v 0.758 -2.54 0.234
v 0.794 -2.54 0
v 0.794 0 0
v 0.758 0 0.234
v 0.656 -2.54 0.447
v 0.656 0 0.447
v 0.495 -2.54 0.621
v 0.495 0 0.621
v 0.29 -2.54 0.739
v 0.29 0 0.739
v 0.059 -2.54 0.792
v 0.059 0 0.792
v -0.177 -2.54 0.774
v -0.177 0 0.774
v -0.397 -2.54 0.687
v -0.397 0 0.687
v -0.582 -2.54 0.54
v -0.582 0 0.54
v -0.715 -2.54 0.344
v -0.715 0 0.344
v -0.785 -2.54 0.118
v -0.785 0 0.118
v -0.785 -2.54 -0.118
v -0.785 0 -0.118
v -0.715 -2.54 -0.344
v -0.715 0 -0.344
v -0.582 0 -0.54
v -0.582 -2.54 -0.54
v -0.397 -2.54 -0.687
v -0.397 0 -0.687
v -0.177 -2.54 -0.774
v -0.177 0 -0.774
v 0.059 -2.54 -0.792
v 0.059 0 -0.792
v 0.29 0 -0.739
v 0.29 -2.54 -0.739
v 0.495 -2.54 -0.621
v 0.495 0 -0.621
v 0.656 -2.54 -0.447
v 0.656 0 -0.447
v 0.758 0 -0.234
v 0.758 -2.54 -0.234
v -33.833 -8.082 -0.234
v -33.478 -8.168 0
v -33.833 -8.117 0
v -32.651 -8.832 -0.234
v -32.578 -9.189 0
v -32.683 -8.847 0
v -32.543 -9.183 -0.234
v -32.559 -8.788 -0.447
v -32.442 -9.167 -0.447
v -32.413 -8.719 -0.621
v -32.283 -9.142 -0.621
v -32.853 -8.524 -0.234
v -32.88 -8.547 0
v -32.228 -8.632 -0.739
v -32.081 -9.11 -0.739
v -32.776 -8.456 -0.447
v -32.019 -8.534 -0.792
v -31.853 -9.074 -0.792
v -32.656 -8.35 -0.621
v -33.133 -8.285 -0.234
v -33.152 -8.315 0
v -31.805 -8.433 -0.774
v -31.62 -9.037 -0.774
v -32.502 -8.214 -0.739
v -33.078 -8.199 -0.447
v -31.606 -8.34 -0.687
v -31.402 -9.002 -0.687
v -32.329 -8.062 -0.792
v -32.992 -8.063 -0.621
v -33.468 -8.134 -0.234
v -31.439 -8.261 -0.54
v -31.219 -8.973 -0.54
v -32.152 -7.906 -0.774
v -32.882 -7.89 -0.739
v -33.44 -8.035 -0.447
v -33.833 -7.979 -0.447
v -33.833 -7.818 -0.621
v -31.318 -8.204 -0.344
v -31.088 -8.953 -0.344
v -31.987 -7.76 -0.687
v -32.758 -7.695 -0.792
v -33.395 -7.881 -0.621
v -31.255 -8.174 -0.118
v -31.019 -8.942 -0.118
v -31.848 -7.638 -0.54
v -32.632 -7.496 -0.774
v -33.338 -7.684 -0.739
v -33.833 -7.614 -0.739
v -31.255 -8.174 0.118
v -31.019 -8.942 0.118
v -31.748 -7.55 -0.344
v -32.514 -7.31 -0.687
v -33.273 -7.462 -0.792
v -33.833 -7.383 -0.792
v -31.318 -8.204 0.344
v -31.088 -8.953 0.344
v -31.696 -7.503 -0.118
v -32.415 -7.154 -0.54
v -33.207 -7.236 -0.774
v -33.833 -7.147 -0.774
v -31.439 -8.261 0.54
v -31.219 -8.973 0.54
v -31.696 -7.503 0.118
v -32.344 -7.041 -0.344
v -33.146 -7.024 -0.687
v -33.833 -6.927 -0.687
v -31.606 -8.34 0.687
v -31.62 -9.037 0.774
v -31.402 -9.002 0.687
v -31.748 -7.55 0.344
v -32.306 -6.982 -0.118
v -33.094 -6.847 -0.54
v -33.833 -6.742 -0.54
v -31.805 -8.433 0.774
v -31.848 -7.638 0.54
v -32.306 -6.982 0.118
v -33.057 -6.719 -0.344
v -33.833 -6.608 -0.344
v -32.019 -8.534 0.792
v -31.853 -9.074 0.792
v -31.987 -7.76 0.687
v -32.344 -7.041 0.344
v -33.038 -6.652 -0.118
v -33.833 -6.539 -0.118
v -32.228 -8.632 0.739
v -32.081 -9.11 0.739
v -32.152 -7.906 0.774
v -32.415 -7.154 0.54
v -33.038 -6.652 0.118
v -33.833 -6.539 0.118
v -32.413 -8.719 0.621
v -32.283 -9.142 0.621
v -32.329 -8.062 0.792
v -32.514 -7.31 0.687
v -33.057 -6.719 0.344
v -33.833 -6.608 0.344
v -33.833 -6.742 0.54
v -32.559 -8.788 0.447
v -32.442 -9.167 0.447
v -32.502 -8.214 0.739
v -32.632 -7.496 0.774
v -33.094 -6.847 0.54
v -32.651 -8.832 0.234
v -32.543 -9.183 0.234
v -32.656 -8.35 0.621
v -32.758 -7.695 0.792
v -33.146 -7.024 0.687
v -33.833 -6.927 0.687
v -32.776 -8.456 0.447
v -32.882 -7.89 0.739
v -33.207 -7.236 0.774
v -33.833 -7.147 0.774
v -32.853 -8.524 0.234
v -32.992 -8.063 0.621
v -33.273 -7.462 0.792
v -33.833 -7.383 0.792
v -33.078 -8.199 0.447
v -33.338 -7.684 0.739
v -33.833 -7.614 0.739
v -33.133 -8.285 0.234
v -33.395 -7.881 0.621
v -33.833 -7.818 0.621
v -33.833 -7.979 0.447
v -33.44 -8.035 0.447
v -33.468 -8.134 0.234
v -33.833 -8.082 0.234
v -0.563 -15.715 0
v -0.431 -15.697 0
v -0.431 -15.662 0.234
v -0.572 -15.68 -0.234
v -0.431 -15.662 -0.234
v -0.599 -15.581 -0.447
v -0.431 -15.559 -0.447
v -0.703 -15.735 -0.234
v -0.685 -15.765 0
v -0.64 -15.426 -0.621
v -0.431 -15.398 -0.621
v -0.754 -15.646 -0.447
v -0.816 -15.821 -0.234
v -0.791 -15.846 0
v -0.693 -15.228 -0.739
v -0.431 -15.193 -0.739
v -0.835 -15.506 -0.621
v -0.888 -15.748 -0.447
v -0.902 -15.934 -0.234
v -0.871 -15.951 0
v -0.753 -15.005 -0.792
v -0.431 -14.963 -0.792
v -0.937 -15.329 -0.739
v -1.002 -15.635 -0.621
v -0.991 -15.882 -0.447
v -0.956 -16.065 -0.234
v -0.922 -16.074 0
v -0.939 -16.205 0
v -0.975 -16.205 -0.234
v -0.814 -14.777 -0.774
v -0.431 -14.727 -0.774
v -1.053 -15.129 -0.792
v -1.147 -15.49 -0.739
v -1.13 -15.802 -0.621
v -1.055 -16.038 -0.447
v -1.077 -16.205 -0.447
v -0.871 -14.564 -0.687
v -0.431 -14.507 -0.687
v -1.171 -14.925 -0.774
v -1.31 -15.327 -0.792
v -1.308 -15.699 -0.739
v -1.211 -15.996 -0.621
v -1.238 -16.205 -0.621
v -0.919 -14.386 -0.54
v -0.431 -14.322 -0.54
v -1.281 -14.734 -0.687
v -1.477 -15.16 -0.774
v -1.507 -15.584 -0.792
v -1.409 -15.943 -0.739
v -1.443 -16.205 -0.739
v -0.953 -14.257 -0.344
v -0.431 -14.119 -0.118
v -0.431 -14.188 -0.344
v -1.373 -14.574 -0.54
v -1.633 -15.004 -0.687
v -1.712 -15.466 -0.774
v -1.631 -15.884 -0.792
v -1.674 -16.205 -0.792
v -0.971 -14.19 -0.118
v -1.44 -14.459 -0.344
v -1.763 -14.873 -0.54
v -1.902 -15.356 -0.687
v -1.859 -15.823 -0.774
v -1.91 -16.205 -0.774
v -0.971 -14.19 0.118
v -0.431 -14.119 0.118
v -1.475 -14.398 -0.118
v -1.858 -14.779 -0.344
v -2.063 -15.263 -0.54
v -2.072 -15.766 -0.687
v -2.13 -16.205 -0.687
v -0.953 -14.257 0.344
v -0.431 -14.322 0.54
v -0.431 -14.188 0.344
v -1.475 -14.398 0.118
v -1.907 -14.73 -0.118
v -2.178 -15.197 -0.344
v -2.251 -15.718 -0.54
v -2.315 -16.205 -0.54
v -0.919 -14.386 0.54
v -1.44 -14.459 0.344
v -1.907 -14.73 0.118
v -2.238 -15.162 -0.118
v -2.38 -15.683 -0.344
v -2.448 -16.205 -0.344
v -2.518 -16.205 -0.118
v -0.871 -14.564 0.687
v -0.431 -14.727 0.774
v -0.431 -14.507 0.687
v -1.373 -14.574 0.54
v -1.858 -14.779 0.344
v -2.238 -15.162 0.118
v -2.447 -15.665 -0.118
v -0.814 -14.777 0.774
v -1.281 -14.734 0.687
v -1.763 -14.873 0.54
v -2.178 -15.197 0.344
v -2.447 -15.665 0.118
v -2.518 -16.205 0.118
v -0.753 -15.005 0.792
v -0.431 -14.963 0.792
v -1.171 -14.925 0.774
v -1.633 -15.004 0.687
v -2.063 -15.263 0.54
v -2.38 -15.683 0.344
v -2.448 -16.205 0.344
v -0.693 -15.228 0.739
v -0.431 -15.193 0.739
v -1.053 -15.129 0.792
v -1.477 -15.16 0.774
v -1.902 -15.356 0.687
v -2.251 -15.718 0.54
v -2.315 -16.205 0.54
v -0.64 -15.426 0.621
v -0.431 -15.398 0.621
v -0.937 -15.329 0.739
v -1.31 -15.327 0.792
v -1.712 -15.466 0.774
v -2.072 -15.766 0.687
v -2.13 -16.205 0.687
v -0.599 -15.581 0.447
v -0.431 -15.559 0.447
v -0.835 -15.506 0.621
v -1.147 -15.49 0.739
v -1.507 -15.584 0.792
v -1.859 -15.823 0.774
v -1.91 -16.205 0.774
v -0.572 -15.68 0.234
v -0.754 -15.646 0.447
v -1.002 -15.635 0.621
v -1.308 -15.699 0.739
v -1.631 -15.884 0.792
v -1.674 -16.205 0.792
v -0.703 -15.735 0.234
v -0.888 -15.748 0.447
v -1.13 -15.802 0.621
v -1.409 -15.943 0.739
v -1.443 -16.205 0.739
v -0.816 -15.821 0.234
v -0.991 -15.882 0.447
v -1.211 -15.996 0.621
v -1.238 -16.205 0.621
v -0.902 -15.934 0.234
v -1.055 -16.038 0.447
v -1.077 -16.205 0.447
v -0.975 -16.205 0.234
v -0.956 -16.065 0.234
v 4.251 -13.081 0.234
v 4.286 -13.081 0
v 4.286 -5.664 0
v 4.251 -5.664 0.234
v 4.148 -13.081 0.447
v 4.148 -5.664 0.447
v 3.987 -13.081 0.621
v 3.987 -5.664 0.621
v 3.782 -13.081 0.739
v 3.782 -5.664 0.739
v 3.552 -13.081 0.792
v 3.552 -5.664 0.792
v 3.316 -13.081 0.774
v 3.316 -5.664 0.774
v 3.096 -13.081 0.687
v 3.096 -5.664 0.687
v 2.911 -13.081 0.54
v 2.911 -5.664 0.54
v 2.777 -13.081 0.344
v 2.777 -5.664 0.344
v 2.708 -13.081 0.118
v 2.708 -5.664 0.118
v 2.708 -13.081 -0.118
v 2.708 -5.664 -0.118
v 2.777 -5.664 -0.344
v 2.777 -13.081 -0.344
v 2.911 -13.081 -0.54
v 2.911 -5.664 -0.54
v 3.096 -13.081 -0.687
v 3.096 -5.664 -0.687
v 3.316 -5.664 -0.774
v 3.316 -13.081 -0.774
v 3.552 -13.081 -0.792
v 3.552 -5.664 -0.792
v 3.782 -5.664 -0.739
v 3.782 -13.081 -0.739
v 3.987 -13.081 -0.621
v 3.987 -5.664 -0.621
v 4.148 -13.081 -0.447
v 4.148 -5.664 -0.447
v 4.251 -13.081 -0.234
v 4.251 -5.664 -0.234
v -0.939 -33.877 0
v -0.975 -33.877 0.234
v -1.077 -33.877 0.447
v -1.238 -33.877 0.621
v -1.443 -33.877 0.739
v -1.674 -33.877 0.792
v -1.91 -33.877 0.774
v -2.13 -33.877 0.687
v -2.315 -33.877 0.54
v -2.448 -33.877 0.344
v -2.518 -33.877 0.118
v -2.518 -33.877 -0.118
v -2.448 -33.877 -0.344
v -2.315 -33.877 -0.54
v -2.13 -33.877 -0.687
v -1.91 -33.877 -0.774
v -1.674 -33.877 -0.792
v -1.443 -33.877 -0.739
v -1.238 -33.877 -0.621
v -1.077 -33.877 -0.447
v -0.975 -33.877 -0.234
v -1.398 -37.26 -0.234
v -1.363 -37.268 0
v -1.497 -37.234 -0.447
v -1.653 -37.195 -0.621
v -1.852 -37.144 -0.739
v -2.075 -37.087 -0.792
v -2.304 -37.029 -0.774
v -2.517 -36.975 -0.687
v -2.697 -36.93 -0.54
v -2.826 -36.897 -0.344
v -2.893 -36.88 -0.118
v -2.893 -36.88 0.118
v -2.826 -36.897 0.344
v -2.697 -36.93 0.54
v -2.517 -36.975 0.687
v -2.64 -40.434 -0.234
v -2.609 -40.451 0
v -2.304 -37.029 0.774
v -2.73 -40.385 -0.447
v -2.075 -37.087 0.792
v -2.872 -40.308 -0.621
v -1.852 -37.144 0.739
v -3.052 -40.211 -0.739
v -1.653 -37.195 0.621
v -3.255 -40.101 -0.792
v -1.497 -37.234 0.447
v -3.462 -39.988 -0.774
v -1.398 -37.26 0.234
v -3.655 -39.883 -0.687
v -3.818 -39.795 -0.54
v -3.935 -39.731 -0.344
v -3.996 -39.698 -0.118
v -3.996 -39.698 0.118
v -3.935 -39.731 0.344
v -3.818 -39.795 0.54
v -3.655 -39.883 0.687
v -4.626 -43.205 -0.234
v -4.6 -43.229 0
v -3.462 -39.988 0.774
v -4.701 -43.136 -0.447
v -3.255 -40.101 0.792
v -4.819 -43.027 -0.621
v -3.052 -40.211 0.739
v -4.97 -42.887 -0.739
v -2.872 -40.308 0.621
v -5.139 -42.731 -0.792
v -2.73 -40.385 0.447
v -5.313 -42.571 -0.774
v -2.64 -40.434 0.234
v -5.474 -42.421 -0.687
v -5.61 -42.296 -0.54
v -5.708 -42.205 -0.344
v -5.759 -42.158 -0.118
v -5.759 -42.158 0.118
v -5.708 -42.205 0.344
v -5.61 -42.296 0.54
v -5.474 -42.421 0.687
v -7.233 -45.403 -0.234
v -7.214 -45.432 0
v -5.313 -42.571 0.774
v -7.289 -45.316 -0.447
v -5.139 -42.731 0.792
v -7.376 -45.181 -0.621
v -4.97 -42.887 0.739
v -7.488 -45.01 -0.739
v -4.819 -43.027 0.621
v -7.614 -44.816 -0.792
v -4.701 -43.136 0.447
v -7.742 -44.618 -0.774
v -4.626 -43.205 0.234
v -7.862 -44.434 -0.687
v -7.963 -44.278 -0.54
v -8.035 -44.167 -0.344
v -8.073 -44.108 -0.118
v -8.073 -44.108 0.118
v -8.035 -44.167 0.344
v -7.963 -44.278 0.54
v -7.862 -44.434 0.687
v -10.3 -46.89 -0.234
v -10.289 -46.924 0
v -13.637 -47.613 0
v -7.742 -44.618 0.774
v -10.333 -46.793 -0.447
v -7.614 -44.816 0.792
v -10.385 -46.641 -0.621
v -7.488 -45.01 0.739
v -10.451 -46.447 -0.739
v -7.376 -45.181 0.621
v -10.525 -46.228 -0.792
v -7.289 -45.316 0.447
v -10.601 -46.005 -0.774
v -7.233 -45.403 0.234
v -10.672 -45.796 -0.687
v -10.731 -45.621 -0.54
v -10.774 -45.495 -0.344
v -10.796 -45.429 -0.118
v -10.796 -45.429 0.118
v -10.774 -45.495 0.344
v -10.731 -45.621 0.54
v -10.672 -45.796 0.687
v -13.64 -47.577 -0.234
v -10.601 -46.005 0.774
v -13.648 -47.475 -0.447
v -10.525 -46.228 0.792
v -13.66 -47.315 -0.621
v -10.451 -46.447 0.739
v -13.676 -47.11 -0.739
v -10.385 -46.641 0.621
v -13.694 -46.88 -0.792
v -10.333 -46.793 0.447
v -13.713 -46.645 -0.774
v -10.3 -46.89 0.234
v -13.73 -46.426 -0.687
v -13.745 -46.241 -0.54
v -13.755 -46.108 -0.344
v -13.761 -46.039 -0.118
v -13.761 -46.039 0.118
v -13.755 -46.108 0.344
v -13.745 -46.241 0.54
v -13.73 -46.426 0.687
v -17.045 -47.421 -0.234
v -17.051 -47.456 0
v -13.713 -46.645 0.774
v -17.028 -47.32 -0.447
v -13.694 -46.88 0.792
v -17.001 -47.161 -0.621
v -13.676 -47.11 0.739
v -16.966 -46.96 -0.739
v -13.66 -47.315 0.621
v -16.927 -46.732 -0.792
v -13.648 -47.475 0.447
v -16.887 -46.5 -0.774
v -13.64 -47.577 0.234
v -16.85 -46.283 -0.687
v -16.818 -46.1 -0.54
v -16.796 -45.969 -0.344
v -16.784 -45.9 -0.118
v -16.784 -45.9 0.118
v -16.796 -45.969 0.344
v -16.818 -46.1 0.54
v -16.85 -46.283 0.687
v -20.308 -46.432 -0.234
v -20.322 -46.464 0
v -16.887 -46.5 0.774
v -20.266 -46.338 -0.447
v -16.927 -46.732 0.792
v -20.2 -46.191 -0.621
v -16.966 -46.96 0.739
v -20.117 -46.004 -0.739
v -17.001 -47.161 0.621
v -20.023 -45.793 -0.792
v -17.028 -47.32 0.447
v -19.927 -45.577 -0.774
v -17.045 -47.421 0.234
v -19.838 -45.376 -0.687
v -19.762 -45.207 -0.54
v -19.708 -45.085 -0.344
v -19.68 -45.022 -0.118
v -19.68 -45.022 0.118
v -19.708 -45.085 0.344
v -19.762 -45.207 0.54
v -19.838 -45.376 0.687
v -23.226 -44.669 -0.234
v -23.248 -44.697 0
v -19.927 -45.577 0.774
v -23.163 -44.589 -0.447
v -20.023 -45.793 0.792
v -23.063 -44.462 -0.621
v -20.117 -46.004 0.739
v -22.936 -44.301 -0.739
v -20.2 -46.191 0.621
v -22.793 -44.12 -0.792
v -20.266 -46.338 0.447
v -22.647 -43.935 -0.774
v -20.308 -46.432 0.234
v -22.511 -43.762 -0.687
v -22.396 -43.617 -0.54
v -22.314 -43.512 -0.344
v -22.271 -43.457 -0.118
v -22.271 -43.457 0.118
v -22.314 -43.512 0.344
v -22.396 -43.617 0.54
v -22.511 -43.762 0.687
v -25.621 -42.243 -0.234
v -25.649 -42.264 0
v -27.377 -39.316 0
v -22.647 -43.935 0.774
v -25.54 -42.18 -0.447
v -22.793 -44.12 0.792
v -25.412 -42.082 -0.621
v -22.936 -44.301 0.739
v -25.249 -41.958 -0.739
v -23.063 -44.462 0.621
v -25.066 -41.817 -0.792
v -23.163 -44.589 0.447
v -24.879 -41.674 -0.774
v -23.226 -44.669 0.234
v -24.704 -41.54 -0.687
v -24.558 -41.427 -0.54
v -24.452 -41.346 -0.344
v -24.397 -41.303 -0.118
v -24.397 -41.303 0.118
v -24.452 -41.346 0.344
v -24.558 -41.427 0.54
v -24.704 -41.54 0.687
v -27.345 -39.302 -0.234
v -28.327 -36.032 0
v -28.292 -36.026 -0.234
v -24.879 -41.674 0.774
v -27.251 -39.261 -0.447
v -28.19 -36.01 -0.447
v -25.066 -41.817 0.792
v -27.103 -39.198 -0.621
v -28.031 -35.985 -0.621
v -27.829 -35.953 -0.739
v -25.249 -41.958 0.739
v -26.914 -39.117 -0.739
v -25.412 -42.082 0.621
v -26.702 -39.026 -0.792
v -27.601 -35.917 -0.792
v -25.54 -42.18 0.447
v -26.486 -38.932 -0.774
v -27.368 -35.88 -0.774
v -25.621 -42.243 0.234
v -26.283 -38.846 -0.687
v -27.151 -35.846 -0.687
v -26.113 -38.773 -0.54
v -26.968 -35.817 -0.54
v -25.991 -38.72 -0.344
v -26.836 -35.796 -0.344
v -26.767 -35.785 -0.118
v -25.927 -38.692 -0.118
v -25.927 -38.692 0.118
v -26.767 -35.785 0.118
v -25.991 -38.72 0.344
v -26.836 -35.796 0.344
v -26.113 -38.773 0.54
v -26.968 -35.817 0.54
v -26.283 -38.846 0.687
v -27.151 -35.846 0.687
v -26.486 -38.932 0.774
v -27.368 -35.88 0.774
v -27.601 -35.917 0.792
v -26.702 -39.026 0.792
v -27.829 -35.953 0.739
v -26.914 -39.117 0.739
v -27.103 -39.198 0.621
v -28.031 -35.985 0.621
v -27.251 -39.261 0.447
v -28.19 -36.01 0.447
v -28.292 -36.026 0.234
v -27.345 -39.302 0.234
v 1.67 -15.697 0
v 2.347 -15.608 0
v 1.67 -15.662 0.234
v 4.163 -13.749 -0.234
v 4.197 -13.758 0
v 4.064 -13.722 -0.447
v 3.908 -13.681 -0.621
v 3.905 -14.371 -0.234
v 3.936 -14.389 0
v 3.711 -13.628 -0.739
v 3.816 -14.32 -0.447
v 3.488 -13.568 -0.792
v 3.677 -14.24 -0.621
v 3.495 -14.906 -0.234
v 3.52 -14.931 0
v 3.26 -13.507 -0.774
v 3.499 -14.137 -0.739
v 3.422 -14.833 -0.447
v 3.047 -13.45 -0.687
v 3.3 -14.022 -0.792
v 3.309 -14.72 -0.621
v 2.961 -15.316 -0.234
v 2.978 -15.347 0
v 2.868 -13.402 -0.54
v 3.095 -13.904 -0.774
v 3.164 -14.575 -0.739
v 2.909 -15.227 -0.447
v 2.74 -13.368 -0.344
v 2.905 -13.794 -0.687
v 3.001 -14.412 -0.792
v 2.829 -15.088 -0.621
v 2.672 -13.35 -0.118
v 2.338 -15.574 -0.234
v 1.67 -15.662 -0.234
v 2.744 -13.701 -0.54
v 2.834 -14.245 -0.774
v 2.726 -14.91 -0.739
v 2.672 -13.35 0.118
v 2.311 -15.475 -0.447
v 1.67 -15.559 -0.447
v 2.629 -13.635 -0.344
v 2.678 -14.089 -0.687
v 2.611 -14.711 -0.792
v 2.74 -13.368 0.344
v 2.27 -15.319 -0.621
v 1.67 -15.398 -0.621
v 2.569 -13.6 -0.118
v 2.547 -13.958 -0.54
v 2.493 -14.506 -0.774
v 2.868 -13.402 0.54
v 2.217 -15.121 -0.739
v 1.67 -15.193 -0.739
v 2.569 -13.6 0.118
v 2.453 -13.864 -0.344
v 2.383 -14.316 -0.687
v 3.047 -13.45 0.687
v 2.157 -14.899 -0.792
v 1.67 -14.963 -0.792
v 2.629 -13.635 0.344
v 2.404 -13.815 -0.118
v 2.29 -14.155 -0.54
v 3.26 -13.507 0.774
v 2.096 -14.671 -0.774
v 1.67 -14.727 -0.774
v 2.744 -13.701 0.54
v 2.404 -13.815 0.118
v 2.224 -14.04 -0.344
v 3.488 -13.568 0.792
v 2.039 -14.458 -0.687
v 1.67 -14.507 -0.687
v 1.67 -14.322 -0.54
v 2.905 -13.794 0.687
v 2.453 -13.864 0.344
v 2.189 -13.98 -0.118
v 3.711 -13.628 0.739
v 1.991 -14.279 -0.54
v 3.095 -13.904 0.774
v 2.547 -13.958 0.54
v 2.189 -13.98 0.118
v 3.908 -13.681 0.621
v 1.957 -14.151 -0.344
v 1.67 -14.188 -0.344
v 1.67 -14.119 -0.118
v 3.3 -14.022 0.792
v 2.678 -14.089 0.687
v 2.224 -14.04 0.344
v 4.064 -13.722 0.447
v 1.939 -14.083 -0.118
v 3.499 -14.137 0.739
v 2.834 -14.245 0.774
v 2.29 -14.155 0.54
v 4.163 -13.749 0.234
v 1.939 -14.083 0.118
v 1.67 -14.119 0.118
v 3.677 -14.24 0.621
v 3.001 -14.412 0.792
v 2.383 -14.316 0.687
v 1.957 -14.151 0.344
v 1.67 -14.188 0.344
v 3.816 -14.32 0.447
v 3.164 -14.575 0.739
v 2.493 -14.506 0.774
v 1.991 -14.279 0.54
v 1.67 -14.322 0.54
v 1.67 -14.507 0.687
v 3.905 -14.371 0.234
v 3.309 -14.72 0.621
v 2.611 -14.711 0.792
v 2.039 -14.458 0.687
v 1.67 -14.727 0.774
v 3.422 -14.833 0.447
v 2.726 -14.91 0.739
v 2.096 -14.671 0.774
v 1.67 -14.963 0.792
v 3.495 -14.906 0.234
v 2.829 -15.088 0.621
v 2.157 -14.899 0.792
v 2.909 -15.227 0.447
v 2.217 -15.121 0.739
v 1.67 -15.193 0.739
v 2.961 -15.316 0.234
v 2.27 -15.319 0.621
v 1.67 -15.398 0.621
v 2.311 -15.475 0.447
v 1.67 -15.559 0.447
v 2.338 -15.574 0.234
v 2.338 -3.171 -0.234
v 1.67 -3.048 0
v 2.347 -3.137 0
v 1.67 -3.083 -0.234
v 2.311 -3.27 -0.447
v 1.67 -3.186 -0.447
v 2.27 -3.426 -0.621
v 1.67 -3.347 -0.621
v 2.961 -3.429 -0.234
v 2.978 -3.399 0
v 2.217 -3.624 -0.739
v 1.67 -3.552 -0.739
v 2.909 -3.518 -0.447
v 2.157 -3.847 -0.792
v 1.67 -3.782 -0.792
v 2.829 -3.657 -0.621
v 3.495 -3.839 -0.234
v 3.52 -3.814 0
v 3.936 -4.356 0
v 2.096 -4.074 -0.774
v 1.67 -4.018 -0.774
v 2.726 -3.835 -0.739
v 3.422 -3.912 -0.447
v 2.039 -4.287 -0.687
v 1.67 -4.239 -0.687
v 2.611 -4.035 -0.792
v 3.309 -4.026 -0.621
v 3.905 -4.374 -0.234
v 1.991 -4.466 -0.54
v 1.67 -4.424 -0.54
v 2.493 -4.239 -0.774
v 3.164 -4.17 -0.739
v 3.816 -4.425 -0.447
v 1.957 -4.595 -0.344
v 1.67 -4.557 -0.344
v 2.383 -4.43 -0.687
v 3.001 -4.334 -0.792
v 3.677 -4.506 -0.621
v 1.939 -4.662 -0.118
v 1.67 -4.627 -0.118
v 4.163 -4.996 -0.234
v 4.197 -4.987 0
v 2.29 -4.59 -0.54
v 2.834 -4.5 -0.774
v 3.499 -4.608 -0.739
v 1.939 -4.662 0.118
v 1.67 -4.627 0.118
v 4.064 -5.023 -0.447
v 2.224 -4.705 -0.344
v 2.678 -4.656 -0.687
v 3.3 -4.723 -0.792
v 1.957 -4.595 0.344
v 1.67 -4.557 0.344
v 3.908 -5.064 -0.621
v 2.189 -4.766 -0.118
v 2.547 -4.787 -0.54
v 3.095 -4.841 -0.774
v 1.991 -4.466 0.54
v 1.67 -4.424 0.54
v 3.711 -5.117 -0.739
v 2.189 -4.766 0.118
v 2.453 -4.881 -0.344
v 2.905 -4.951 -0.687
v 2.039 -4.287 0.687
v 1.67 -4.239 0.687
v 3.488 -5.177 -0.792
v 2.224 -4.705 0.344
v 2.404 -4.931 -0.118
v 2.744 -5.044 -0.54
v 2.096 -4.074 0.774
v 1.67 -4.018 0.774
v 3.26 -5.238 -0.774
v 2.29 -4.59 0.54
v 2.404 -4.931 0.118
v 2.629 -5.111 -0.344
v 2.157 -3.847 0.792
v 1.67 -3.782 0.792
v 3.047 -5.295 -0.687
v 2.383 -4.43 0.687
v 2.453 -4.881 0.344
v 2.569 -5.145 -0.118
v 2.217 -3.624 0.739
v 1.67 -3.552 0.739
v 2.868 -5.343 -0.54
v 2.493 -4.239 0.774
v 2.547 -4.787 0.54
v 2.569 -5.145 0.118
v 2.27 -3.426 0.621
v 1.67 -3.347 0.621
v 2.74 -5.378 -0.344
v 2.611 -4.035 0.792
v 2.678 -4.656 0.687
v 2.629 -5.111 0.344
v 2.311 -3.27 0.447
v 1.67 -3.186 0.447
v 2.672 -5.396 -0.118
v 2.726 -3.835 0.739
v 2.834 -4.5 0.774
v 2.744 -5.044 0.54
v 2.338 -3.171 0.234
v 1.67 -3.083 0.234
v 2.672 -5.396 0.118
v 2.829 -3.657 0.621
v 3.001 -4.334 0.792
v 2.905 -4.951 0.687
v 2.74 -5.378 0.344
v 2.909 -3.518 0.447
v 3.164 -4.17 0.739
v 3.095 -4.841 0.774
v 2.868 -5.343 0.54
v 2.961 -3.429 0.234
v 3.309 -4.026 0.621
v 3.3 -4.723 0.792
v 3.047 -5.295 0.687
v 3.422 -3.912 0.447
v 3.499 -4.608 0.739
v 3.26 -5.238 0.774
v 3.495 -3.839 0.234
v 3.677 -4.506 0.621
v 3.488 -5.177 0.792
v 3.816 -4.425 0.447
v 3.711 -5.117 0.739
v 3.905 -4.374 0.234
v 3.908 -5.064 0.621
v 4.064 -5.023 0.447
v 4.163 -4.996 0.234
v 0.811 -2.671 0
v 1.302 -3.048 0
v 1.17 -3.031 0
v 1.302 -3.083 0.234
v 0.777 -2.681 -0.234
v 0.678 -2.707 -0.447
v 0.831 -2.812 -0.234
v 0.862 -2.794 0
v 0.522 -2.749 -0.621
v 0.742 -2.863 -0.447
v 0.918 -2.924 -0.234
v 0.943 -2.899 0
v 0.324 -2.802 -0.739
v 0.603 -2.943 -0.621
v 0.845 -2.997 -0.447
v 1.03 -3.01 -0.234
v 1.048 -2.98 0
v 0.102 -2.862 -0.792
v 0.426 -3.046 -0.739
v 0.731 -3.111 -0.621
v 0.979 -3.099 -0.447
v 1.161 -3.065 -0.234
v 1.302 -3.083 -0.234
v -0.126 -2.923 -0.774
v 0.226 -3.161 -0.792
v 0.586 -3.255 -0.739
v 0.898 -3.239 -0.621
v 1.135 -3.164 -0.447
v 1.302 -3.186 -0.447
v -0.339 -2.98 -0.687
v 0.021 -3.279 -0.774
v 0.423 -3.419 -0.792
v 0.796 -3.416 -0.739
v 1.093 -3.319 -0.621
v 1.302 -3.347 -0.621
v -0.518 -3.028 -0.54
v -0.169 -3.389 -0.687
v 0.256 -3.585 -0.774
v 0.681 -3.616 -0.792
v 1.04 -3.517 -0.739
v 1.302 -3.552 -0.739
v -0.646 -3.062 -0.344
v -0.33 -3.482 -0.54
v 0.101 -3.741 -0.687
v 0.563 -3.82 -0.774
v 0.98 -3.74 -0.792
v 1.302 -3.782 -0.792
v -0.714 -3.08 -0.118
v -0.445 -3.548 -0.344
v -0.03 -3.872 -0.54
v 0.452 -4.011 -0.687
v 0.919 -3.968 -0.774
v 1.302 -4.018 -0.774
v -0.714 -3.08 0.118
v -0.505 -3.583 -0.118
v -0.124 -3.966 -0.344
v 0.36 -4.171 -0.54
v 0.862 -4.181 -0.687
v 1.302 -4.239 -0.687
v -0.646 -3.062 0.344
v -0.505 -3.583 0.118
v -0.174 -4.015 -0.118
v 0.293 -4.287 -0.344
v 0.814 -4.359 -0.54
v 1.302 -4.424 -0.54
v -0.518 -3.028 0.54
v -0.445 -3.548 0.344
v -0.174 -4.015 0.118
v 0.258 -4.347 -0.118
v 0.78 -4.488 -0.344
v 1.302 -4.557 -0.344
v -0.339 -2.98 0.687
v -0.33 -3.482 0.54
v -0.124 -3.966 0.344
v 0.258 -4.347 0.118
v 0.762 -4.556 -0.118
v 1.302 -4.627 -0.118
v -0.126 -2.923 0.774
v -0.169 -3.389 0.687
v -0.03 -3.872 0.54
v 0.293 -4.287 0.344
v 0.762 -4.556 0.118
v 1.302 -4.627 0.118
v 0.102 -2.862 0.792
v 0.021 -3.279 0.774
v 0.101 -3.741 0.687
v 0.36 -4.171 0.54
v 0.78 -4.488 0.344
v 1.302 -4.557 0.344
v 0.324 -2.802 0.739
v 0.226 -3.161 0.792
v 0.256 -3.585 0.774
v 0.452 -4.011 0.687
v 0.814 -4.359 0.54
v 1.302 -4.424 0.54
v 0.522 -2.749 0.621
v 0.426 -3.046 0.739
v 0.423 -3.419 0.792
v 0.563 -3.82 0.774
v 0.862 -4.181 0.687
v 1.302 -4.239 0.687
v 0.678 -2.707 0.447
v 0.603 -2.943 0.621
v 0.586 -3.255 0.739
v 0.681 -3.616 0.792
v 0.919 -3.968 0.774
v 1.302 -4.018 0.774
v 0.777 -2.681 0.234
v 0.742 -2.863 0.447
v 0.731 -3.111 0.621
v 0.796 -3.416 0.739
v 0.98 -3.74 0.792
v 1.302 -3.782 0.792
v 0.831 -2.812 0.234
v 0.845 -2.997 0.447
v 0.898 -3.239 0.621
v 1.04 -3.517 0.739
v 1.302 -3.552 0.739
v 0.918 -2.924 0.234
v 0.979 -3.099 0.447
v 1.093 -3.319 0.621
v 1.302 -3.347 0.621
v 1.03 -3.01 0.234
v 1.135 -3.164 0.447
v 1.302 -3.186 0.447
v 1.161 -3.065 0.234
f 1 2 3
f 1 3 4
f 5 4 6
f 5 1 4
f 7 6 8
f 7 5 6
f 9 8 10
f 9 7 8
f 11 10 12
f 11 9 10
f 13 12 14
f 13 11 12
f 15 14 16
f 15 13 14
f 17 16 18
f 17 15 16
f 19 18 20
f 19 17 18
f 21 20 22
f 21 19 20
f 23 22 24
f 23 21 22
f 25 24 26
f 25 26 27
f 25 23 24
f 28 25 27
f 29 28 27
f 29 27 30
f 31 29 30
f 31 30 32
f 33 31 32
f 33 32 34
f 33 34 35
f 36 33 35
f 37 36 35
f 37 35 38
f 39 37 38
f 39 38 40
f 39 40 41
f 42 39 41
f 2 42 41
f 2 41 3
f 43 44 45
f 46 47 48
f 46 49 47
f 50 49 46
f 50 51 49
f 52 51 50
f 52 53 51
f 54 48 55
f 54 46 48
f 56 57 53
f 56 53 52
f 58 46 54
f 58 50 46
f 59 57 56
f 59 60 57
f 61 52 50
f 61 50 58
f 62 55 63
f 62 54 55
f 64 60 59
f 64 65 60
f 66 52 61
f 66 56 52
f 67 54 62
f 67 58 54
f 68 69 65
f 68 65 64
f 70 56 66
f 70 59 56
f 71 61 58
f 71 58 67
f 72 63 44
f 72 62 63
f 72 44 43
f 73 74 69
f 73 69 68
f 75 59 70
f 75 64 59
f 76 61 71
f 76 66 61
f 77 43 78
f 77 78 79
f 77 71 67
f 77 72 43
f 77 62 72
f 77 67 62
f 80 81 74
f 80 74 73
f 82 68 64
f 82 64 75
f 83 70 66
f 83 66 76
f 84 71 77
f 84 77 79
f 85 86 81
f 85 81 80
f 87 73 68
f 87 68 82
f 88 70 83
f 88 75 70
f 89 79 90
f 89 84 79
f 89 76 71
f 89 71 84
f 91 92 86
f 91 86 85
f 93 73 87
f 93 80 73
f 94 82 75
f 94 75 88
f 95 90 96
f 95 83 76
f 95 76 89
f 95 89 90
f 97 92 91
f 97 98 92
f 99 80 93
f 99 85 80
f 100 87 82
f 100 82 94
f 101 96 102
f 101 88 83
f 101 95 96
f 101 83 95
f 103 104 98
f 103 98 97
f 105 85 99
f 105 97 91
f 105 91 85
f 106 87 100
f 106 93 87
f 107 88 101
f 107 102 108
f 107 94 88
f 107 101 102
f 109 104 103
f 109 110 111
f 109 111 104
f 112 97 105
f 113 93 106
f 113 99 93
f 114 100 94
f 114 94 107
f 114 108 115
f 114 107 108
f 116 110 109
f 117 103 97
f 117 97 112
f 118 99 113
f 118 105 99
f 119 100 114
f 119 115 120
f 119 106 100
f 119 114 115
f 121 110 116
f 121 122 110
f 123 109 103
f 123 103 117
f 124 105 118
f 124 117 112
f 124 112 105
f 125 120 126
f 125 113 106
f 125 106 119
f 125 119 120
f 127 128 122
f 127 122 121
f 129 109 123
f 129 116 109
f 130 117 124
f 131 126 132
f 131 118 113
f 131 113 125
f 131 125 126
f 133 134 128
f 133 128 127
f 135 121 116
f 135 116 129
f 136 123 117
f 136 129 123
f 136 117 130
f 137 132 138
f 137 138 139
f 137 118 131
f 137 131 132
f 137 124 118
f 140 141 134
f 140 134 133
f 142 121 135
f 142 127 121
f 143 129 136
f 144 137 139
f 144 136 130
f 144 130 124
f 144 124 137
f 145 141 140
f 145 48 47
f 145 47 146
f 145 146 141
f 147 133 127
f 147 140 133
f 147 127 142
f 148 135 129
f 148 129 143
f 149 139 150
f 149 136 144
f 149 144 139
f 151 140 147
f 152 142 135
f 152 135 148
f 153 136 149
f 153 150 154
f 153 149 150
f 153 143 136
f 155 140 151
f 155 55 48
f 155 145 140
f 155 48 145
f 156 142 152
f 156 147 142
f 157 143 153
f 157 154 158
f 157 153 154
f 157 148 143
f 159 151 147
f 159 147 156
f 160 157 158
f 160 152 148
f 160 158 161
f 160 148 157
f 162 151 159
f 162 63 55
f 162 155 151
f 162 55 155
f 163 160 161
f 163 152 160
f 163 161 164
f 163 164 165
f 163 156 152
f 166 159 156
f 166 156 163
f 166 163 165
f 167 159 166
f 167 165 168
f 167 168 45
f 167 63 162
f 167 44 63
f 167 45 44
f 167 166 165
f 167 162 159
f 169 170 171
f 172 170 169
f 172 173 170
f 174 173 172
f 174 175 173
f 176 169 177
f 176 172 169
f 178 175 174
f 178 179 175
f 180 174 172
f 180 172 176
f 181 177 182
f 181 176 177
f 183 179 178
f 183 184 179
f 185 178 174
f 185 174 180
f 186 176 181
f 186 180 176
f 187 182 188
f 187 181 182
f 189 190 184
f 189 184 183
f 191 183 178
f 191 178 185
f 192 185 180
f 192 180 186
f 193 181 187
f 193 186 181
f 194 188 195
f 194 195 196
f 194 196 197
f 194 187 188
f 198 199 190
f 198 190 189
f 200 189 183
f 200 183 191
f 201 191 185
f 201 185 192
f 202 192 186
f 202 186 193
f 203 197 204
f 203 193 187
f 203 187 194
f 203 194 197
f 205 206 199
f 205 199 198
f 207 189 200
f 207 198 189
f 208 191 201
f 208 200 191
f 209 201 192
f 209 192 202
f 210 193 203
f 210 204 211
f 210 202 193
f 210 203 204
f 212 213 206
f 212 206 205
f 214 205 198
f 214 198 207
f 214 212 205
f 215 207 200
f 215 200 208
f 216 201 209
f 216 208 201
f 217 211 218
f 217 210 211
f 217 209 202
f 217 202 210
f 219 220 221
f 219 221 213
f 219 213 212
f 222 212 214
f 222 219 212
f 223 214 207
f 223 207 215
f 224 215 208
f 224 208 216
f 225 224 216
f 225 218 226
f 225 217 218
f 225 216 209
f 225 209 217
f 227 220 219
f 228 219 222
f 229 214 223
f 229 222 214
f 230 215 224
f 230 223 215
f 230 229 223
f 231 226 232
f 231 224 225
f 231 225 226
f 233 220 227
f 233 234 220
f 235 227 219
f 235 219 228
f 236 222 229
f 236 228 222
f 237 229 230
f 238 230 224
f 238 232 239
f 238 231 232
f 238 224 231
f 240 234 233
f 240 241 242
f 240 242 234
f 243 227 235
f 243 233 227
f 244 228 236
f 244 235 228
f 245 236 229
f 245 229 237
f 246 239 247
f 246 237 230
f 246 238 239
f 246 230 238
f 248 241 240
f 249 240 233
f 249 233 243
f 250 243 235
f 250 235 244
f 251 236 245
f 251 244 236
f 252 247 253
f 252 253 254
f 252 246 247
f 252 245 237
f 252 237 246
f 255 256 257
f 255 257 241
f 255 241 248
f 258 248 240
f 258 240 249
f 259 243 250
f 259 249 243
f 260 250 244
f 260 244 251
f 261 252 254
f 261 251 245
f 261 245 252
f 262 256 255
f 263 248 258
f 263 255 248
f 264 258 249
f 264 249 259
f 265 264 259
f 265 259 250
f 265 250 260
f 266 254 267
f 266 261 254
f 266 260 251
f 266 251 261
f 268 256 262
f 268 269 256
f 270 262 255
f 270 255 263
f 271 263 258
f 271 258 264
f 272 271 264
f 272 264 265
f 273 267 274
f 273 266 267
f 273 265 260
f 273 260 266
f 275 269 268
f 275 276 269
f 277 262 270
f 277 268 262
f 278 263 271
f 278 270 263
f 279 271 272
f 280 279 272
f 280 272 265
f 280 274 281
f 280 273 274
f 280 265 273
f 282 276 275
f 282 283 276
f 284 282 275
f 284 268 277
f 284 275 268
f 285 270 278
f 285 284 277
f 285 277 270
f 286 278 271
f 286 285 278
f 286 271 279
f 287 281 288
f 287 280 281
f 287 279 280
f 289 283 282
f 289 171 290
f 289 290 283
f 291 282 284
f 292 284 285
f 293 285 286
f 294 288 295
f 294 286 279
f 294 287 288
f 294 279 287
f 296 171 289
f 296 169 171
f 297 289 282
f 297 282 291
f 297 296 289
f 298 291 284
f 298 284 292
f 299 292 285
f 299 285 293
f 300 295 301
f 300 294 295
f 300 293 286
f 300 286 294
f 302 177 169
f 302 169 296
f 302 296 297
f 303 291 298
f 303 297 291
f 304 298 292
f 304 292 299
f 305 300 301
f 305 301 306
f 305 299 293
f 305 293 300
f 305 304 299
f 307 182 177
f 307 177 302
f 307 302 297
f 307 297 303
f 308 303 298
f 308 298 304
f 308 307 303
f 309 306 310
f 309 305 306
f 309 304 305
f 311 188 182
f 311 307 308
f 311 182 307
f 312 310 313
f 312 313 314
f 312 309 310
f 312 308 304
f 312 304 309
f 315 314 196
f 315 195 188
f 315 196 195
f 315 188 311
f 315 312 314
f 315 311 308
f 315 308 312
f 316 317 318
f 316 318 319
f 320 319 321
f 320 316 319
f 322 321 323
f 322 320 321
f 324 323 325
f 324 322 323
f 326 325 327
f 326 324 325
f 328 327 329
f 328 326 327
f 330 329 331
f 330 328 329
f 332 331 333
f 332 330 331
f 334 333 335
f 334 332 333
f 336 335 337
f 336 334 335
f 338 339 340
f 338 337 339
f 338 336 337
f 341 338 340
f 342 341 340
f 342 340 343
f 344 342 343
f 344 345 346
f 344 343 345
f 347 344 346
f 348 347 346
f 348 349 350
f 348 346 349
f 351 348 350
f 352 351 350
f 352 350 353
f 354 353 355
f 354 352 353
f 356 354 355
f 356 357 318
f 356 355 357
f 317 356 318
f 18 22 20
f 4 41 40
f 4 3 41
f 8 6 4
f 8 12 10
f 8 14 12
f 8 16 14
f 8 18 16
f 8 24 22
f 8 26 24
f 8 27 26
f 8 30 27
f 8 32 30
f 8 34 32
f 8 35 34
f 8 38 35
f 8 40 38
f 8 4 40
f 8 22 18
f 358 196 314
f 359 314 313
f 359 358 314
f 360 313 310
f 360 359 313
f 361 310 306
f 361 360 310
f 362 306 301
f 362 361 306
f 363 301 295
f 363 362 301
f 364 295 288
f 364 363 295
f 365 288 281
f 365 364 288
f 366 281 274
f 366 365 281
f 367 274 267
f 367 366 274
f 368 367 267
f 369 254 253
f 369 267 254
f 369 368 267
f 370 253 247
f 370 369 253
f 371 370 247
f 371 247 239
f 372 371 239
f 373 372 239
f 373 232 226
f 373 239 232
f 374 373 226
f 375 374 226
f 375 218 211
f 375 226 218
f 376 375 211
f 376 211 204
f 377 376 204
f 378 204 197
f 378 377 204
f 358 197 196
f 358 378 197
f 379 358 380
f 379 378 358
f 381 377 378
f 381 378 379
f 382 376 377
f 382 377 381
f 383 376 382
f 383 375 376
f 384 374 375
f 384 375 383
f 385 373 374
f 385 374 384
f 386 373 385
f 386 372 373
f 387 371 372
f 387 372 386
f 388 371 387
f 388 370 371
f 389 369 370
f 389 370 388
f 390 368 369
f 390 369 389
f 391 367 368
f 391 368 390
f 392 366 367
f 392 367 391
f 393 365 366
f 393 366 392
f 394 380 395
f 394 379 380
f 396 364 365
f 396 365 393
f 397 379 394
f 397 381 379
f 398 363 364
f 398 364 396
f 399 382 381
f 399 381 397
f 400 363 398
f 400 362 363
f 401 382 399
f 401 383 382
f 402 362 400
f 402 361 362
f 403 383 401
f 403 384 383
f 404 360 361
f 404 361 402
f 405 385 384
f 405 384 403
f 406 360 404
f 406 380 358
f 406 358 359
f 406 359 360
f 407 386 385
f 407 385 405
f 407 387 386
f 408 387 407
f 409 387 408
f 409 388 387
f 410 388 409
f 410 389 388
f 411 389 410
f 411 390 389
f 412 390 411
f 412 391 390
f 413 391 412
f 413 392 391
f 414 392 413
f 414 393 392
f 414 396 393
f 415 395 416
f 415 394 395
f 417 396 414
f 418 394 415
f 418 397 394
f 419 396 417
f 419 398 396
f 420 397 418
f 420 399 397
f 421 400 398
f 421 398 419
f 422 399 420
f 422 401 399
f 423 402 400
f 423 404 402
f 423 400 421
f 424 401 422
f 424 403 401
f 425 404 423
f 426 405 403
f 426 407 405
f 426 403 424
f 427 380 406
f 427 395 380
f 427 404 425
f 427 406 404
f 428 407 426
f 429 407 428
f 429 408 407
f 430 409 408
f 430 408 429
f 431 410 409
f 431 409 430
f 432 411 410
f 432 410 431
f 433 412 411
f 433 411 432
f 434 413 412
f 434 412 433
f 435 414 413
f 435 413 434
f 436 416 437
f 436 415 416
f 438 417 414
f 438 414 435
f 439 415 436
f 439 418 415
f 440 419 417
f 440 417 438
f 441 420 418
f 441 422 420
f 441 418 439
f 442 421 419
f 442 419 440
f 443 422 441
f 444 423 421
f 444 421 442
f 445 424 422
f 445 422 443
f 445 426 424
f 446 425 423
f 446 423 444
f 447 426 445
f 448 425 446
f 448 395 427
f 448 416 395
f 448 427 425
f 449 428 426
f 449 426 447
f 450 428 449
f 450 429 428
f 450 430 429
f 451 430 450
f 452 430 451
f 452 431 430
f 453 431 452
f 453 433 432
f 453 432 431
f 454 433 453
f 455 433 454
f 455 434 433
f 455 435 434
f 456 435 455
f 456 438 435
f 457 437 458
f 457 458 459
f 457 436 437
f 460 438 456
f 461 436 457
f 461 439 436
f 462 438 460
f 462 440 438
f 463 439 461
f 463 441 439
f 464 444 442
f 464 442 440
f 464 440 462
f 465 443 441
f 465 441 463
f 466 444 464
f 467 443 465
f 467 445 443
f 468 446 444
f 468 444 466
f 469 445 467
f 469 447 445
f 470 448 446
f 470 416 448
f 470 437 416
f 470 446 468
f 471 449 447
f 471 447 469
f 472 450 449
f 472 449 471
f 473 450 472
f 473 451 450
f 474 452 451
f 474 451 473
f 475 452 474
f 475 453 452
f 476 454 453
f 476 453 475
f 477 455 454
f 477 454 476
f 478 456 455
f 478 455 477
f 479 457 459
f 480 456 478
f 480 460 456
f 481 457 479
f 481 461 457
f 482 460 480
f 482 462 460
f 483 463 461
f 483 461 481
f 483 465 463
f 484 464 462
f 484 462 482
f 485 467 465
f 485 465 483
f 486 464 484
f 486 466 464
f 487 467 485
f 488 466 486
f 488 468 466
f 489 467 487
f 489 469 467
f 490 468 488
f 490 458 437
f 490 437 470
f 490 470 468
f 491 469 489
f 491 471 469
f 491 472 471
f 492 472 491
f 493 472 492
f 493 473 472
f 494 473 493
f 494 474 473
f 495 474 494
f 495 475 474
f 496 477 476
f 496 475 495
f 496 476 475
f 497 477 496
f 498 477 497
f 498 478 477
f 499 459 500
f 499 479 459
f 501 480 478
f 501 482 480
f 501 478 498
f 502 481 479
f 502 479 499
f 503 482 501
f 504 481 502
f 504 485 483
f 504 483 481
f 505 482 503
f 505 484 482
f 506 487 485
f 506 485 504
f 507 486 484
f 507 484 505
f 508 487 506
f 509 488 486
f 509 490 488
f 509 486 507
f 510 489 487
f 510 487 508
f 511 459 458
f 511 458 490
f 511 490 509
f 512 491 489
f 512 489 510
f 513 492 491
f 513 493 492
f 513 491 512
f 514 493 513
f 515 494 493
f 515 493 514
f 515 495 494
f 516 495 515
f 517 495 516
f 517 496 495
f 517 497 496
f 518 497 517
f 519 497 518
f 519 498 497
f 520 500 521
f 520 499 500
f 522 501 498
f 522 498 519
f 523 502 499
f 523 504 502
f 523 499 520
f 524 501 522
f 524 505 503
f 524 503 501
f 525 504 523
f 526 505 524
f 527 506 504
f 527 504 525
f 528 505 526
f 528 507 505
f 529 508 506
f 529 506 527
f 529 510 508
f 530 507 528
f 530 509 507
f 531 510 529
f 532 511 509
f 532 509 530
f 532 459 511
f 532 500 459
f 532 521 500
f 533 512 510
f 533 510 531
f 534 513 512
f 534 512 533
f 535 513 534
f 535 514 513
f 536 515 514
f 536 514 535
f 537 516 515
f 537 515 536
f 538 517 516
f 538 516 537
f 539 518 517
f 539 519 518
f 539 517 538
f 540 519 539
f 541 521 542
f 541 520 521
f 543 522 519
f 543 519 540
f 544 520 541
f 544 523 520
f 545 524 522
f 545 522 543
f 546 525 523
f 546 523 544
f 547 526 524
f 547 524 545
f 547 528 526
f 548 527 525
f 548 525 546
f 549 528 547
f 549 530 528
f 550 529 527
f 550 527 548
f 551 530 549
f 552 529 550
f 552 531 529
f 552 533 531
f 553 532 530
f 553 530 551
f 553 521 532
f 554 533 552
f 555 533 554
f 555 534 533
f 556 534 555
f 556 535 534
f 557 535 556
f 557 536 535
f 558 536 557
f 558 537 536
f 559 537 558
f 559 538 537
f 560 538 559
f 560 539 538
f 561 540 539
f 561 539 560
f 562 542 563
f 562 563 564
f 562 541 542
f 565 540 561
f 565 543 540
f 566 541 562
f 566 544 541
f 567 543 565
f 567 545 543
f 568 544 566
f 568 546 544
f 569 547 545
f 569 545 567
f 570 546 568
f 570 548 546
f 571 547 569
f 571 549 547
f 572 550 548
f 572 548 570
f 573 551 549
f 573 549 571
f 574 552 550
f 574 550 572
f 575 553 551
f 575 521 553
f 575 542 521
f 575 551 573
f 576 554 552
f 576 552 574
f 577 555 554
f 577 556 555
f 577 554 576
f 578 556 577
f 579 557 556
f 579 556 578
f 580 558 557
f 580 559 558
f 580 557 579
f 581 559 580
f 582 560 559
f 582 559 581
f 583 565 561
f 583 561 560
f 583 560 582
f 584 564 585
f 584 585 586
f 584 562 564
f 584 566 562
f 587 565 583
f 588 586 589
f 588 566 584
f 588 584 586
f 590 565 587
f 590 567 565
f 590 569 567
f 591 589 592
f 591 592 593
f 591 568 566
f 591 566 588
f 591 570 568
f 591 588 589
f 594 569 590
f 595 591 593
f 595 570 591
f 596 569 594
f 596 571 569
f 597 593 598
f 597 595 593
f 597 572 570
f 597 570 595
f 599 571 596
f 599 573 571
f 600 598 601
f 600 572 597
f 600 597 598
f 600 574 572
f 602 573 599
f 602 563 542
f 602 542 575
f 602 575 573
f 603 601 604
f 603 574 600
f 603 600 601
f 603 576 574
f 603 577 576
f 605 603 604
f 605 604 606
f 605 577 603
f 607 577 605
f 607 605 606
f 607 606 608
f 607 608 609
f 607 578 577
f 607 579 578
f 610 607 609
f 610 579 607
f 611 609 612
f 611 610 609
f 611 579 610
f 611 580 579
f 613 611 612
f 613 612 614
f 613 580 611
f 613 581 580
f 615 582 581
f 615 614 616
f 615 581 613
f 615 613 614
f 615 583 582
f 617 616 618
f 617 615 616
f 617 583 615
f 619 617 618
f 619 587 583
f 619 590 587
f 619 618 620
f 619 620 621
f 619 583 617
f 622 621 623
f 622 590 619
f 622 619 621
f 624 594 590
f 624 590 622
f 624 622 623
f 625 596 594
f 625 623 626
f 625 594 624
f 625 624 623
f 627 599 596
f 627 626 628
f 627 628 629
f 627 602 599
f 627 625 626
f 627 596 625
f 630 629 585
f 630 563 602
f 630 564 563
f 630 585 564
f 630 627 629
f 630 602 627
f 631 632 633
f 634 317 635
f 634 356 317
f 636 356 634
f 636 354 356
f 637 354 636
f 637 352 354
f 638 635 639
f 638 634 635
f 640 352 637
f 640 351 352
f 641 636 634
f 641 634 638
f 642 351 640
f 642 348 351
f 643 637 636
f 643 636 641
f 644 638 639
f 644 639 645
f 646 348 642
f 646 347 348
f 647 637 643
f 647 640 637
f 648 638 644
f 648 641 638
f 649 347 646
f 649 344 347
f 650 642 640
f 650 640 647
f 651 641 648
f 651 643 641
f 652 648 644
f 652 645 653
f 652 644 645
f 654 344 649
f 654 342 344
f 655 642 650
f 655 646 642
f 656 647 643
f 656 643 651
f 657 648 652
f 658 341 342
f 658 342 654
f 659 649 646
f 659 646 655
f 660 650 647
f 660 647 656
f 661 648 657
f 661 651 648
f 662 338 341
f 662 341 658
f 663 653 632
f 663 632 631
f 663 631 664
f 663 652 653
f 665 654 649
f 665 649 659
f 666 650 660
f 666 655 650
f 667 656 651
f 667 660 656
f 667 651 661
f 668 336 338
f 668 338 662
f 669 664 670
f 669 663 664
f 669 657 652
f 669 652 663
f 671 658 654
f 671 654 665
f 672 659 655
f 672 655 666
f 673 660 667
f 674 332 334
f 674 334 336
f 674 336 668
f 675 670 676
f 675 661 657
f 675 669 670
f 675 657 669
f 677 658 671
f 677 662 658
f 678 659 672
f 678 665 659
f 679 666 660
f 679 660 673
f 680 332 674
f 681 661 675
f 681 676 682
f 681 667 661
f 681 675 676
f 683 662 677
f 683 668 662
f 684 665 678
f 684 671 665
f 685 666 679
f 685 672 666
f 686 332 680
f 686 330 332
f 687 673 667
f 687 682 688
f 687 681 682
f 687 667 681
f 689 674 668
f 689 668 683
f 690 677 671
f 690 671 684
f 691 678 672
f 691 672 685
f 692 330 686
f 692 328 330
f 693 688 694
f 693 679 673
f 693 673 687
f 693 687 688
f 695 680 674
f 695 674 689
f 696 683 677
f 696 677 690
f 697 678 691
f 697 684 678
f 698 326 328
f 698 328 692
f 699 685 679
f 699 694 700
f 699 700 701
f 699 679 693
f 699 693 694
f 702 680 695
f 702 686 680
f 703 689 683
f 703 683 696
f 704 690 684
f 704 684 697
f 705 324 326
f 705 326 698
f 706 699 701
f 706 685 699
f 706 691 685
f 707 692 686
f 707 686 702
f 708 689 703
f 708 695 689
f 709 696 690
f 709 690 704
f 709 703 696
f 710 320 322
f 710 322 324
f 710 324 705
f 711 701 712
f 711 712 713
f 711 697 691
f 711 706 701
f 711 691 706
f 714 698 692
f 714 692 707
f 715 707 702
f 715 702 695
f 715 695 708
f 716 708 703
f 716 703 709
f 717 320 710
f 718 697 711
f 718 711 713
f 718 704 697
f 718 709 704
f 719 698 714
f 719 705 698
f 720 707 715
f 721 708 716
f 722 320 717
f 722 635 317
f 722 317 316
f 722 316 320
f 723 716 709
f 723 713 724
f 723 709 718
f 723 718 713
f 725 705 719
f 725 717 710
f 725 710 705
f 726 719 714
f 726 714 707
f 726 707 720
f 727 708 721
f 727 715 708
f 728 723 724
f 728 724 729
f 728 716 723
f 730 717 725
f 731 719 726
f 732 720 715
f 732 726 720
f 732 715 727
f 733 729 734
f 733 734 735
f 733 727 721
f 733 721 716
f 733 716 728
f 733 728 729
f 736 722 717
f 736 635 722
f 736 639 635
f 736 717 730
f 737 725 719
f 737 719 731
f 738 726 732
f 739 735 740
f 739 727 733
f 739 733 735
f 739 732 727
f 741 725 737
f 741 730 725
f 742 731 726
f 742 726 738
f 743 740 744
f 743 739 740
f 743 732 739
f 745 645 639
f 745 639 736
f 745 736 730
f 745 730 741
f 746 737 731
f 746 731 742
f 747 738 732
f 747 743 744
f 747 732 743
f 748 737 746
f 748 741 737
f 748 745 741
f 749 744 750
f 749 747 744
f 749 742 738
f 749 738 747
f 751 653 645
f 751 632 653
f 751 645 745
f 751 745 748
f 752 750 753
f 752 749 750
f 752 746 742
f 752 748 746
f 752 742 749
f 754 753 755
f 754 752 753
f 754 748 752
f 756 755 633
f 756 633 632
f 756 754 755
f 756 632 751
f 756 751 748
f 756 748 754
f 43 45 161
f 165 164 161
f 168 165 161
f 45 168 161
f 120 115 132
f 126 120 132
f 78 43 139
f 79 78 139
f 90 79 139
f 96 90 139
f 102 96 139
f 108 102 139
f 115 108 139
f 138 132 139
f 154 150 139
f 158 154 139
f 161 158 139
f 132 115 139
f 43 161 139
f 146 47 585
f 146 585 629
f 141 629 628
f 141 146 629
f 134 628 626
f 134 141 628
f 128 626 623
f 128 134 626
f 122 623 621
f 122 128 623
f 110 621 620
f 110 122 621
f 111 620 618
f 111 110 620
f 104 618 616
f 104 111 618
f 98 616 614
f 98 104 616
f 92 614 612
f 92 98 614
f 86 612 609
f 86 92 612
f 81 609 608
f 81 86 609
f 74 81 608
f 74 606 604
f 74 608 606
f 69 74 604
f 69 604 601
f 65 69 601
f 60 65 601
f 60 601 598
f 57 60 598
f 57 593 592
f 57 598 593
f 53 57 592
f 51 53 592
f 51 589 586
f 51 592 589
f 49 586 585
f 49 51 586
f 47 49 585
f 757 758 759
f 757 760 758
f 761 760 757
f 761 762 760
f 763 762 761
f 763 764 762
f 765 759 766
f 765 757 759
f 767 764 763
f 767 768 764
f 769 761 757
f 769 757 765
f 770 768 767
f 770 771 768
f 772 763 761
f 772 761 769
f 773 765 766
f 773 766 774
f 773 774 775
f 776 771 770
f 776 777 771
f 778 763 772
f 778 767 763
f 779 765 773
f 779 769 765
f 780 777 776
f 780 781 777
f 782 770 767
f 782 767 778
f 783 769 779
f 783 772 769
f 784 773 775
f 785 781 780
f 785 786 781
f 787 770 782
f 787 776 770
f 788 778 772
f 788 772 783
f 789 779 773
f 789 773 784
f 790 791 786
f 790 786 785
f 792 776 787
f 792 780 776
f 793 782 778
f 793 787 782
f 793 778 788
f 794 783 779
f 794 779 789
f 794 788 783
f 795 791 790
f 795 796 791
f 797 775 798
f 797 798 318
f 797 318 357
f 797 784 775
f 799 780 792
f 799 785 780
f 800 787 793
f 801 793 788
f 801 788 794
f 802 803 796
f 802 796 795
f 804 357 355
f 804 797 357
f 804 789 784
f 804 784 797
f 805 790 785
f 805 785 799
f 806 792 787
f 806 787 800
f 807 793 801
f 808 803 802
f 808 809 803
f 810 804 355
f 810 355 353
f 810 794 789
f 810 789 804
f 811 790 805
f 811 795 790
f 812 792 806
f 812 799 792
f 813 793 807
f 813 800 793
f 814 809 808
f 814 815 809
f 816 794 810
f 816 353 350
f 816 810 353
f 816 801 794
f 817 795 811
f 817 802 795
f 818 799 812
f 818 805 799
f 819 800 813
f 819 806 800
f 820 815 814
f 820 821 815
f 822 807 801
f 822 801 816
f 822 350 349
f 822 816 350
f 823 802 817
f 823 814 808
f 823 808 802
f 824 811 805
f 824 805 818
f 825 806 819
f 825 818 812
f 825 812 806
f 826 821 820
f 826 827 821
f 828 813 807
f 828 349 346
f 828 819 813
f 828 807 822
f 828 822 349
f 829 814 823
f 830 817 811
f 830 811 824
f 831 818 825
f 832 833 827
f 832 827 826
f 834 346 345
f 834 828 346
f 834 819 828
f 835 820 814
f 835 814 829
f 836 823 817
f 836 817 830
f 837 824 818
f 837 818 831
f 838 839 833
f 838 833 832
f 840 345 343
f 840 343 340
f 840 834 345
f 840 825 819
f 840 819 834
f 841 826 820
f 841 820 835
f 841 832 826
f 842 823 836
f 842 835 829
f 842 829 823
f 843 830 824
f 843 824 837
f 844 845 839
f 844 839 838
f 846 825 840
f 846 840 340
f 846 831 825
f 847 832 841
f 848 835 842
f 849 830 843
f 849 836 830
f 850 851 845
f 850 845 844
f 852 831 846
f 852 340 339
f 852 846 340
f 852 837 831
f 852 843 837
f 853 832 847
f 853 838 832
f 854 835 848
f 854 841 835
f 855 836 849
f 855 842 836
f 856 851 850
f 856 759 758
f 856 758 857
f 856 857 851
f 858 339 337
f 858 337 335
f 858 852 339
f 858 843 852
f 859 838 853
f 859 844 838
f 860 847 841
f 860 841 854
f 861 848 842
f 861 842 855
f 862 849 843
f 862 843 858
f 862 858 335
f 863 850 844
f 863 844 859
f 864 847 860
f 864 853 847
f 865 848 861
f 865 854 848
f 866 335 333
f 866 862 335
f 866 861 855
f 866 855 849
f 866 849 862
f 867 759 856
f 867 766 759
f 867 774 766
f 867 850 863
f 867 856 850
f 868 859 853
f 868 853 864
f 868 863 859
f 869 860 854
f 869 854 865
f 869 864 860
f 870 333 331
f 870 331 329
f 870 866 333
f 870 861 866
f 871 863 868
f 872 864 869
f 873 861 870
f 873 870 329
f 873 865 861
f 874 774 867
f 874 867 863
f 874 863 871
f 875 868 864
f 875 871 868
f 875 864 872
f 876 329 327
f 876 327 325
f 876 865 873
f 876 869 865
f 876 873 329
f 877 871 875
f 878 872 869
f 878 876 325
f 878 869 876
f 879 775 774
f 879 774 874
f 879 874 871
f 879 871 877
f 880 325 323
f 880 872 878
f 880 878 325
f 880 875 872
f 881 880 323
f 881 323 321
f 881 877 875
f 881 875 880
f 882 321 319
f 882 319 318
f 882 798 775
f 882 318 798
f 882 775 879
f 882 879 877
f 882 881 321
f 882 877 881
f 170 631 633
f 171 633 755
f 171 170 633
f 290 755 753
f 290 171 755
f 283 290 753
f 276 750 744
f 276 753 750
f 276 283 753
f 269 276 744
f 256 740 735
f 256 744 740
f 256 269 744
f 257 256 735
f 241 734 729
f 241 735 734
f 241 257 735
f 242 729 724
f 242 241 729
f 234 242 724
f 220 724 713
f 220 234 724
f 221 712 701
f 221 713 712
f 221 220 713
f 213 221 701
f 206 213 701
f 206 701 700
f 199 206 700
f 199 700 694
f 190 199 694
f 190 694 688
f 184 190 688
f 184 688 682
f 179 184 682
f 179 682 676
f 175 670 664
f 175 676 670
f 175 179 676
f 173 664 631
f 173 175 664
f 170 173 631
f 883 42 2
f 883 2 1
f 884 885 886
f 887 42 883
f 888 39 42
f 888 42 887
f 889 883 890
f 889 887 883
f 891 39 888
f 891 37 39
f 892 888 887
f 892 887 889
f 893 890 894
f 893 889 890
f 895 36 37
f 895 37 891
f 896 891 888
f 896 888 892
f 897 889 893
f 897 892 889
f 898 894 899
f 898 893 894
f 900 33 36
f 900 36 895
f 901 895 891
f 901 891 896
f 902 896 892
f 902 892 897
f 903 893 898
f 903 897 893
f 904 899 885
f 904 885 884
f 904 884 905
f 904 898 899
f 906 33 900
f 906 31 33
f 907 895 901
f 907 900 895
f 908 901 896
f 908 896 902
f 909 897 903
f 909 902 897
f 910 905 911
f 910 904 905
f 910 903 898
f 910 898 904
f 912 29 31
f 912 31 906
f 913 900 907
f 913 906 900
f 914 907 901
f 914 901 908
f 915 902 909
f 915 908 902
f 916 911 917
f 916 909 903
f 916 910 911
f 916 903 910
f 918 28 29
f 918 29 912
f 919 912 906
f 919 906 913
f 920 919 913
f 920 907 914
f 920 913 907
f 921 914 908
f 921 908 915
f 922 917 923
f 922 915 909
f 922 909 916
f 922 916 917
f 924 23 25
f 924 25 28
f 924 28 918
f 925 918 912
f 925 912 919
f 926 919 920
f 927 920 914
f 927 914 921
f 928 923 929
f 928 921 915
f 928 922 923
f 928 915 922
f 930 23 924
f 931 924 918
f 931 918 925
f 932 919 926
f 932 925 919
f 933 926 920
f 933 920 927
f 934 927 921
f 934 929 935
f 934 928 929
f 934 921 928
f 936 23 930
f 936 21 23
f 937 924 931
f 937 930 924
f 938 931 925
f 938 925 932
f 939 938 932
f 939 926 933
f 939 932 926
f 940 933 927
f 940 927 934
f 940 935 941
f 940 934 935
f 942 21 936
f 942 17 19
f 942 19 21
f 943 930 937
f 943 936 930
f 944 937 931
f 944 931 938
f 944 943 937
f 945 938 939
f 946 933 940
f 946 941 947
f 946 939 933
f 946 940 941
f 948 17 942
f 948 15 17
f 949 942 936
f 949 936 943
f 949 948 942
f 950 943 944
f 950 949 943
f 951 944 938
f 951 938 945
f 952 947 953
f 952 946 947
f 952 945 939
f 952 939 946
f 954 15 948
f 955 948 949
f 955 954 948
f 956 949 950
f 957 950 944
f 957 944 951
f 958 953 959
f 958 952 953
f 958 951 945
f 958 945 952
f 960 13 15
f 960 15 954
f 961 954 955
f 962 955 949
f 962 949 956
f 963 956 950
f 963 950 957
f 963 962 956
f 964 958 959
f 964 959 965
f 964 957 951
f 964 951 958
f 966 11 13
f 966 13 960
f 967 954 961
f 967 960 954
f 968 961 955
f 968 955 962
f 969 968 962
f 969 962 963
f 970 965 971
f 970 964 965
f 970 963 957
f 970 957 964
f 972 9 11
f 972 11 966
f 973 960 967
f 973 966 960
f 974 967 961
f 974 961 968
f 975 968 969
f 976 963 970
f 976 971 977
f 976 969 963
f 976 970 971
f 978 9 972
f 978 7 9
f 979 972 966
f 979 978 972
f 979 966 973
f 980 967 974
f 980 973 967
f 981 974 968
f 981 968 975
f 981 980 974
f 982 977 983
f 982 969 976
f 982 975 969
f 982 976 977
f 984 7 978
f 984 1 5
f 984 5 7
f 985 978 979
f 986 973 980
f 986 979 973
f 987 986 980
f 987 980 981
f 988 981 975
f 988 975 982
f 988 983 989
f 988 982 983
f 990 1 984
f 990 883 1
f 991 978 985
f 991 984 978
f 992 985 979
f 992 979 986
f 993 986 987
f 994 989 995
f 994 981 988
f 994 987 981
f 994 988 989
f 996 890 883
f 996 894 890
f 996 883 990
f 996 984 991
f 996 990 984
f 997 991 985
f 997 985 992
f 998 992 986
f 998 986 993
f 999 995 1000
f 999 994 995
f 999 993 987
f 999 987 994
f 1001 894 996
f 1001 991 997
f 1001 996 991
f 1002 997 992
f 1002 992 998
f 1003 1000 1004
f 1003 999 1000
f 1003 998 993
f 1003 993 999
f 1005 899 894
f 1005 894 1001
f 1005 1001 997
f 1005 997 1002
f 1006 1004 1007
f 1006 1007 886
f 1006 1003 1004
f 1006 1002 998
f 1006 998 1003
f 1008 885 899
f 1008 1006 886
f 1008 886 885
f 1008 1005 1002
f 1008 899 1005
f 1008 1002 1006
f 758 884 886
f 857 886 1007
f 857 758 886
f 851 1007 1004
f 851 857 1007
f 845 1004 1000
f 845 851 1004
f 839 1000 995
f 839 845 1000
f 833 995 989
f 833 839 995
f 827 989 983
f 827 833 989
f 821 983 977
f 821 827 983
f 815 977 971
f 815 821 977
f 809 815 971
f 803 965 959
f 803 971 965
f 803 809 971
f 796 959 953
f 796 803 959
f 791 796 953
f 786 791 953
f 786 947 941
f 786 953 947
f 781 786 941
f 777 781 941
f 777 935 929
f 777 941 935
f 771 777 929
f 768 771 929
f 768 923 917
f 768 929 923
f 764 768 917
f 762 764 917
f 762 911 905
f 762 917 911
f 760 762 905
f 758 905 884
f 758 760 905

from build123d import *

# Parameters (mm, degrees)
SKETCH2_R = 0.79375


with BuildPart() as part:
    # Sweep1: sweep along a path in Sketch1
    with BuildLine(Plane.XY) as sweep1_path:
        Line((0, 0), (0, -2.54))
        ThreePointArc((0, -2.54), (0.381273748, -3.460476252), (1.30175, -3.84175))
        Line((1.30175, -3.84175), (1.67005, -3.84175))
        ThreePointArc((1.67005, -3.84175), (2.958716753, -4.375533247), (3.4925, -5.6642))
        Line((3.4925, -5.6642), (3.4925, -13.081))
        ThreePointArc((3.4925, -13.081), (2.958716753, -14.369666753), (1.67005, -14.90345))
        Line((1.67005, -14.90345), (-0.431397122, -14.90345))
        ThreePointArc((-0.431397122, -14.90345), (-1.351873374, -15.284723748), (-1.733147122, -16.2052))
        Line((-1.733147122, -16.2052), (-1.733147122, -33.876598998))
        ThreePointArc((-1.733147122, -33.876598998), (-13.699036699, -46.821225414), (-27.542592028, -35.907846364))
        Line((-27.542592028, -35.907846364), (-31.794167919, -9.064452644))
        ThreePointArc((-31.794167919, -9.064452644), (-32.492211322, -7.818006459), (-33.832509732, -7.323544271))
    # Sketch2 → Sweep1 (sweep)
    with BuildSketch(Plane(origin=(0, 0, 0), x_dir=(1, 0, 0), z_dir=(0, 1, 0))):
        Circle(SKETCH2_R)
    sweep(path=sweep1_path.line)


solid = part.part
